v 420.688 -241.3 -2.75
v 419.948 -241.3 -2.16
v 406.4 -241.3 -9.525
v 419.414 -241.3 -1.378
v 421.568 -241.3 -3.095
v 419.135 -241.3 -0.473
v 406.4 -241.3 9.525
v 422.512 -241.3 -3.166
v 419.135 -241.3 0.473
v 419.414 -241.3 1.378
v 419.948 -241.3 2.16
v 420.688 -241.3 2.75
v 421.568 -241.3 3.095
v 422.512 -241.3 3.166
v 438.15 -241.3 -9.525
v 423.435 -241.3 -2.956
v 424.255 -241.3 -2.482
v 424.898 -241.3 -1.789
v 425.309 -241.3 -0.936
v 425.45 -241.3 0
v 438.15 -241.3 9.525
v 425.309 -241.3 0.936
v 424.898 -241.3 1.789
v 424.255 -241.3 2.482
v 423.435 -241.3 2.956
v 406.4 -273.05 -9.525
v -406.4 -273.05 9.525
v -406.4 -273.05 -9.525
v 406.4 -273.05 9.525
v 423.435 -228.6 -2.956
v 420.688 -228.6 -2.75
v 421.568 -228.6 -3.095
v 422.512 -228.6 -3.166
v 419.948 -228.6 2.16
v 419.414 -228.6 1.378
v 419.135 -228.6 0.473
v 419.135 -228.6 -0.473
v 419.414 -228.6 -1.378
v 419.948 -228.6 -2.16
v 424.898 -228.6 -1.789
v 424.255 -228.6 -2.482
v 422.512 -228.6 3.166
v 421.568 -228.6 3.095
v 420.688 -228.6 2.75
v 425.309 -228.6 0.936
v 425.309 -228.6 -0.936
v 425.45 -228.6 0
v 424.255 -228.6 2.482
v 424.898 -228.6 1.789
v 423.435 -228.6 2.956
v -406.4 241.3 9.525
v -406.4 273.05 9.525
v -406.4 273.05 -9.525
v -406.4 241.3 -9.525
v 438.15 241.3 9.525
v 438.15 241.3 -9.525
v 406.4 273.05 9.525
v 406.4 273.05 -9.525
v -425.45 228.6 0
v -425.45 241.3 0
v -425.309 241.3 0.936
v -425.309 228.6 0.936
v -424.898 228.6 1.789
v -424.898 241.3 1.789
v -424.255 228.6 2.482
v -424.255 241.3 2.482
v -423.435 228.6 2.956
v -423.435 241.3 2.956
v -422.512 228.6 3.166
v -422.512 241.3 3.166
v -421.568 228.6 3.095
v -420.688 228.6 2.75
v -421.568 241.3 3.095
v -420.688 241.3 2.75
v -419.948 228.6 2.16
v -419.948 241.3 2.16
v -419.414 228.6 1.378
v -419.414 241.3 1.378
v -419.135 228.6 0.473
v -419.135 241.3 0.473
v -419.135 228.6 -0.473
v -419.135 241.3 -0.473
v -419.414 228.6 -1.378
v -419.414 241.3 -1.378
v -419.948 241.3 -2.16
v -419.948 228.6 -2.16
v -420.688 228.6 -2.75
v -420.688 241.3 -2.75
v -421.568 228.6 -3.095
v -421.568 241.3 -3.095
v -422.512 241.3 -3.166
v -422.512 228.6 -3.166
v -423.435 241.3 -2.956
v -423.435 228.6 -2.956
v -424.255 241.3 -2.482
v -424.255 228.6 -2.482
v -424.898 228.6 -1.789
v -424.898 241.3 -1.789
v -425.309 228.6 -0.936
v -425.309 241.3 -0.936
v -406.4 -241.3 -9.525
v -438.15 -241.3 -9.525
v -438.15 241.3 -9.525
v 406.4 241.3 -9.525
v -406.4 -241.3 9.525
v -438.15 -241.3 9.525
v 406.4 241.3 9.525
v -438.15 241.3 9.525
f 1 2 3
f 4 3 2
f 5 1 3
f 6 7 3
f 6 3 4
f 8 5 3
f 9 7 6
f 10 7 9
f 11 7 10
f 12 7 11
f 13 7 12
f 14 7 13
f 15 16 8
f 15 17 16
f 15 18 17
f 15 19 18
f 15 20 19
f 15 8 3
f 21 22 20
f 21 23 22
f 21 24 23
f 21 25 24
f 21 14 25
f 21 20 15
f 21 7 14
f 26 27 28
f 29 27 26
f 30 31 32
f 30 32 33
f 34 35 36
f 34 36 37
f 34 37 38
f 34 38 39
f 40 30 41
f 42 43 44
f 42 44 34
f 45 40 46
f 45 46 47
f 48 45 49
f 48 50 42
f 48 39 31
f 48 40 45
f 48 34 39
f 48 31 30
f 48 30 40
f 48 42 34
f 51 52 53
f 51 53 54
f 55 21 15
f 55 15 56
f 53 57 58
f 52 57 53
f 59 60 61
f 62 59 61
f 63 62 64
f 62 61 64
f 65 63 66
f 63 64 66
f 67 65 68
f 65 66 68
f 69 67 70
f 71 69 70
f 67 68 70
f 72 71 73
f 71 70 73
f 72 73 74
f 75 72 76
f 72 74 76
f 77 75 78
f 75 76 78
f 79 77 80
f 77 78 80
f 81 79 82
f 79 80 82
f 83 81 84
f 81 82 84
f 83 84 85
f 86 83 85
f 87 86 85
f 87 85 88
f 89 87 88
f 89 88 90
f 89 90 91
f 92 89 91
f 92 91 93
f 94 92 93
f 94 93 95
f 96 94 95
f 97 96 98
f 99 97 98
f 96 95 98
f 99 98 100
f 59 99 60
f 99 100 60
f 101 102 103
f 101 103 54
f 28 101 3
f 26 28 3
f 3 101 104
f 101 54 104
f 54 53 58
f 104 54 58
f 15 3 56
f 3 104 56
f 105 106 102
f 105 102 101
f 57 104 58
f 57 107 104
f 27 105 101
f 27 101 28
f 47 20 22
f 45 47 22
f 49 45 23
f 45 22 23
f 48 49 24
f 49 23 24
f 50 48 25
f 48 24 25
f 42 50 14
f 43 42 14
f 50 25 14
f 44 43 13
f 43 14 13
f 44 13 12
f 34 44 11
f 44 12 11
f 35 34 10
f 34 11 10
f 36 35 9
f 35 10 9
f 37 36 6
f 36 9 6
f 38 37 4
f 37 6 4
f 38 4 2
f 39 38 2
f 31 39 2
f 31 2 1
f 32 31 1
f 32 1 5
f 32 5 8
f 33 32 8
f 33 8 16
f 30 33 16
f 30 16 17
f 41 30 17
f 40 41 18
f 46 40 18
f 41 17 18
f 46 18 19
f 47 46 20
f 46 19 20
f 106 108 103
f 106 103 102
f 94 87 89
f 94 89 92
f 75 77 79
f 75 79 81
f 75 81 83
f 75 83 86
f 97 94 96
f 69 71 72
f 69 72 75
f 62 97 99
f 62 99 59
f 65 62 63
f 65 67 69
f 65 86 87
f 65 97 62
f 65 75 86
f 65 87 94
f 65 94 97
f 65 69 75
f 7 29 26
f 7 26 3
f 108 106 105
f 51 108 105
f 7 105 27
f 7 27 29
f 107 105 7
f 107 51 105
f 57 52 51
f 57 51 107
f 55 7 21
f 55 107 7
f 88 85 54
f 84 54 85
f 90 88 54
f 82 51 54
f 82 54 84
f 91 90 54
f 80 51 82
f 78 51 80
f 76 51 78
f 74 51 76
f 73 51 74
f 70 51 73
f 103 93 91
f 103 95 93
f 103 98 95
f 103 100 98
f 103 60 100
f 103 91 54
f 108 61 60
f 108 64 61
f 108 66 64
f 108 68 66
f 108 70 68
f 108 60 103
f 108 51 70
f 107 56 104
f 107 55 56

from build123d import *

# Parameters (mm, degrees)
F1_DEPTH = 9.525
F2_R     = 3.175
F3_DEPTH = 12.7
F4_R     = 3.175
F5_DEPTH = 12.7


with BuildPart() as f1:
    # F0 (on Top) → F1 (new body, symmetric)
    with BuildSketch(Plane.XY):
        Polygon((406.4, 273.05), (-406.4, 273.05), (-406.4, 241.3), (-438.15, 241.3), (-438.15, -241.3), (-406.4, -241.3), (-406.4, -273.05), (406.4, -273.05), (406.4, -241.3), (438.15, -241.3), (438.15, 241.3), (406.4, 241.3), align=None)
    extrude(amount=F1_DEPTH, both=True)

    # F2 (on face) → F3 (cut)
    with BuildSketch(Plane.XZ.offset(241.3)):
        with Locations((422.275, 0)):
            Circle(F2_R)
    extrude(amount=-F3_DEPTH, mode=Mode.SUBTRACT)

    # F4 (on face) → F5 (cut)
    with BuildSketch(Plane(origin=(0, 241.3, 0), x_dir=(-1, 0, 0), z_dir=(0, 1, 0))):
        with Locations((422.275, 0)):
            Circle(F4_R)
    extrude(amount=-F5_DEPTH, mode=Mode.SUBTRACT)


solid = f1.part
